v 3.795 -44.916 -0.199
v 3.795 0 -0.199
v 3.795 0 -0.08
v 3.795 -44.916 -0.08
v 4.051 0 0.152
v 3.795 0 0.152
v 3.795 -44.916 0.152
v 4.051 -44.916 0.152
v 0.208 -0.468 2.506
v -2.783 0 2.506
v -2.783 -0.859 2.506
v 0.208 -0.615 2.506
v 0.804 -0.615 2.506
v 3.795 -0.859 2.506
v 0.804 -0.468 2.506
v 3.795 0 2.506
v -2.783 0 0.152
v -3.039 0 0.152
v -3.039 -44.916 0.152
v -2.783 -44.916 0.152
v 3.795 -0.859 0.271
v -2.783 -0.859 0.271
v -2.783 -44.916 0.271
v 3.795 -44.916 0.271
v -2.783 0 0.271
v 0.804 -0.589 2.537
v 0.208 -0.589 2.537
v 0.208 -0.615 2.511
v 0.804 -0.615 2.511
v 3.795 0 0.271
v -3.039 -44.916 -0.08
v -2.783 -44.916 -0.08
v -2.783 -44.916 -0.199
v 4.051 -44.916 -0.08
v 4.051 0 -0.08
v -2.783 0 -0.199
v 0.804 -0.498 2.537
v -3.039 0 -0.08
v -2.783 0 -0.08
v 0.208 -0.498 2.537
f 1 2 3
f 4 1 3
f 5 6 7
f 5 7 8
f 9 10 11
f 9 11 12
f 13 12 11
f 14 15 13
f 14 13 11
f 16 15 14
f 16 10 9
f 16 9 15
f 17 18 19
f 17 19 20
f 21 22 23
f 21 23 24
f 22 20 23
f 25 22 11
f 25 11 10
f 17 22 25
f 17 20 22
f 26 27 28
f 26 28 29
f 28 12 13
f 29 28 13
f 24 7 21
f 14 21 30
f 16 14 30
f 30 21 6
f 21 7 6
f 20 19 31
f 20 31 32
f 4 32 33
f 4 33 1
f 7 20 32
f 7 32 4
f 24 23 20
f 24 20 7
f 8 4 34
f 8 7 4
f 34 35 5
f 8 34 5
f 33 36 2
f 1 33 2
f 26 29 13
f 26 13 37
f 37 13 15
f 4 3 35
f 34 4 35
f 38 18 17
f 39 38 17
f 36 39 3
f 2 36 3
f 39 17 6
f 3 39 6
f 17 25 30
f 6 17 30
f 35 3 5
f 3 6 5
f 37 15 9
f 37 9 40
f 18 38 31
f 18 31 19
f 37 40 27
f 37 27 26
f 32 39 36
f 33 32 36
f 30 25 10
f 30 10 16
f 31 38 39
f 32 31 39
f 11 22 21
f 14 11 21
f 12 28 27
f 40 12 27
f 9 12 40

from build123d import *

# Parameters (mm, degrees)
F3_W        = 6.5772142261
F3_H        = 0.2320141066
F3_H_2      = 0.1190071926
F3_W_2      = 0.2564042807
F4_DEPTH    = 44.915836
F0_W        = 6.5772142261
F0_H        = 0.8592968807
F1_DEPTH    = 2.2352
F5_W        = 0.5953289354
F5_H        = 0.37034665
F6_DEPTH    = 0.03048
F7_T4_DEPTH = 1.9017438932
F2_SIZE     = 0.0254


# Not quite as in the source:
# - a fillet or chamfer that OpenCascade refuses, or shapes differently, is made with other operations: its cross-section is extruded or revolved along the edge and cut away or added


with BuildPart() as f4:
    # F3 (on Front) → F4 (new body)
    with BuildSketch(Plane.XZ):
        with Locations((0.5059395559, 0.0361560378)):
            Rectangle(F3_W, F3_H)
        with Locations((0.5059395559, 0.2116666874)):
            Rectangle(F3_W, F3_H_2)
        with Locations((0.5059395559, -0.1393546117)):
            Rectangle(F3_W, F3_H_2)
        with Locations((-2.9108696975, 0.0361560378)):
            Rectangle(F3_W_2, F3_H)
        with Locations((3.9227488093, 0.0361560378)):
            Rectangle(F3_W_2, F3_H)
    extrude(amount=F4_DEPTH)

    # F0 (on face) → F1 (join)
    with BuildSketch(Plane.XY.offset(0.2711702837)):
        with Locations((0.5059395559, -0.4296487314)):
            Rectangle(F0_W, F0_H)
    extrude(amount=F1_DEPTH)

    # F5 (on face) → F6 (join)
    with BuildSketch(Plane.XY.offset(2.5063702837)):
        with Locations((0.5059395559, -0.4296485859)):
            Rectangle(F5_W, F5_H)
    extrude(amount=F6_DEPTH)

    # F7: chamfer of 0.254 on 1 edges, made by hand


with BuildPart() as f7_tool2:
    # F7_s3 → F7_t4 (new body)
    with BuildSketch(Plane.YZ.offset(1.4568115025)):
        Polygon((-0.2444752608, 2.2828502837), (-0.4984752608, 2.5368502837), (-0.2444752608, 2.5368502837), align=None)
    extrude(amount=-F7_T4_DEPTH)

    split(bisect_by=Plane.XY.offset(2.5063702837), keep=Keep.TOP)


with BuildPart() as f4_1:
    add(f4.part)

    # F7_t1: cut F7_tool2
    add(f7_tool2.part, mode=Mode.SUBTRACT)

    # F2
    f2_edges = [f4_1.edges().sort_by_distance(p)[0] for p in [
        (0.50594, -0.614822, 2.53685),
    ]]
    chamfer(f2_edges, length=F2_SIZE)


solid = f4_1.part
